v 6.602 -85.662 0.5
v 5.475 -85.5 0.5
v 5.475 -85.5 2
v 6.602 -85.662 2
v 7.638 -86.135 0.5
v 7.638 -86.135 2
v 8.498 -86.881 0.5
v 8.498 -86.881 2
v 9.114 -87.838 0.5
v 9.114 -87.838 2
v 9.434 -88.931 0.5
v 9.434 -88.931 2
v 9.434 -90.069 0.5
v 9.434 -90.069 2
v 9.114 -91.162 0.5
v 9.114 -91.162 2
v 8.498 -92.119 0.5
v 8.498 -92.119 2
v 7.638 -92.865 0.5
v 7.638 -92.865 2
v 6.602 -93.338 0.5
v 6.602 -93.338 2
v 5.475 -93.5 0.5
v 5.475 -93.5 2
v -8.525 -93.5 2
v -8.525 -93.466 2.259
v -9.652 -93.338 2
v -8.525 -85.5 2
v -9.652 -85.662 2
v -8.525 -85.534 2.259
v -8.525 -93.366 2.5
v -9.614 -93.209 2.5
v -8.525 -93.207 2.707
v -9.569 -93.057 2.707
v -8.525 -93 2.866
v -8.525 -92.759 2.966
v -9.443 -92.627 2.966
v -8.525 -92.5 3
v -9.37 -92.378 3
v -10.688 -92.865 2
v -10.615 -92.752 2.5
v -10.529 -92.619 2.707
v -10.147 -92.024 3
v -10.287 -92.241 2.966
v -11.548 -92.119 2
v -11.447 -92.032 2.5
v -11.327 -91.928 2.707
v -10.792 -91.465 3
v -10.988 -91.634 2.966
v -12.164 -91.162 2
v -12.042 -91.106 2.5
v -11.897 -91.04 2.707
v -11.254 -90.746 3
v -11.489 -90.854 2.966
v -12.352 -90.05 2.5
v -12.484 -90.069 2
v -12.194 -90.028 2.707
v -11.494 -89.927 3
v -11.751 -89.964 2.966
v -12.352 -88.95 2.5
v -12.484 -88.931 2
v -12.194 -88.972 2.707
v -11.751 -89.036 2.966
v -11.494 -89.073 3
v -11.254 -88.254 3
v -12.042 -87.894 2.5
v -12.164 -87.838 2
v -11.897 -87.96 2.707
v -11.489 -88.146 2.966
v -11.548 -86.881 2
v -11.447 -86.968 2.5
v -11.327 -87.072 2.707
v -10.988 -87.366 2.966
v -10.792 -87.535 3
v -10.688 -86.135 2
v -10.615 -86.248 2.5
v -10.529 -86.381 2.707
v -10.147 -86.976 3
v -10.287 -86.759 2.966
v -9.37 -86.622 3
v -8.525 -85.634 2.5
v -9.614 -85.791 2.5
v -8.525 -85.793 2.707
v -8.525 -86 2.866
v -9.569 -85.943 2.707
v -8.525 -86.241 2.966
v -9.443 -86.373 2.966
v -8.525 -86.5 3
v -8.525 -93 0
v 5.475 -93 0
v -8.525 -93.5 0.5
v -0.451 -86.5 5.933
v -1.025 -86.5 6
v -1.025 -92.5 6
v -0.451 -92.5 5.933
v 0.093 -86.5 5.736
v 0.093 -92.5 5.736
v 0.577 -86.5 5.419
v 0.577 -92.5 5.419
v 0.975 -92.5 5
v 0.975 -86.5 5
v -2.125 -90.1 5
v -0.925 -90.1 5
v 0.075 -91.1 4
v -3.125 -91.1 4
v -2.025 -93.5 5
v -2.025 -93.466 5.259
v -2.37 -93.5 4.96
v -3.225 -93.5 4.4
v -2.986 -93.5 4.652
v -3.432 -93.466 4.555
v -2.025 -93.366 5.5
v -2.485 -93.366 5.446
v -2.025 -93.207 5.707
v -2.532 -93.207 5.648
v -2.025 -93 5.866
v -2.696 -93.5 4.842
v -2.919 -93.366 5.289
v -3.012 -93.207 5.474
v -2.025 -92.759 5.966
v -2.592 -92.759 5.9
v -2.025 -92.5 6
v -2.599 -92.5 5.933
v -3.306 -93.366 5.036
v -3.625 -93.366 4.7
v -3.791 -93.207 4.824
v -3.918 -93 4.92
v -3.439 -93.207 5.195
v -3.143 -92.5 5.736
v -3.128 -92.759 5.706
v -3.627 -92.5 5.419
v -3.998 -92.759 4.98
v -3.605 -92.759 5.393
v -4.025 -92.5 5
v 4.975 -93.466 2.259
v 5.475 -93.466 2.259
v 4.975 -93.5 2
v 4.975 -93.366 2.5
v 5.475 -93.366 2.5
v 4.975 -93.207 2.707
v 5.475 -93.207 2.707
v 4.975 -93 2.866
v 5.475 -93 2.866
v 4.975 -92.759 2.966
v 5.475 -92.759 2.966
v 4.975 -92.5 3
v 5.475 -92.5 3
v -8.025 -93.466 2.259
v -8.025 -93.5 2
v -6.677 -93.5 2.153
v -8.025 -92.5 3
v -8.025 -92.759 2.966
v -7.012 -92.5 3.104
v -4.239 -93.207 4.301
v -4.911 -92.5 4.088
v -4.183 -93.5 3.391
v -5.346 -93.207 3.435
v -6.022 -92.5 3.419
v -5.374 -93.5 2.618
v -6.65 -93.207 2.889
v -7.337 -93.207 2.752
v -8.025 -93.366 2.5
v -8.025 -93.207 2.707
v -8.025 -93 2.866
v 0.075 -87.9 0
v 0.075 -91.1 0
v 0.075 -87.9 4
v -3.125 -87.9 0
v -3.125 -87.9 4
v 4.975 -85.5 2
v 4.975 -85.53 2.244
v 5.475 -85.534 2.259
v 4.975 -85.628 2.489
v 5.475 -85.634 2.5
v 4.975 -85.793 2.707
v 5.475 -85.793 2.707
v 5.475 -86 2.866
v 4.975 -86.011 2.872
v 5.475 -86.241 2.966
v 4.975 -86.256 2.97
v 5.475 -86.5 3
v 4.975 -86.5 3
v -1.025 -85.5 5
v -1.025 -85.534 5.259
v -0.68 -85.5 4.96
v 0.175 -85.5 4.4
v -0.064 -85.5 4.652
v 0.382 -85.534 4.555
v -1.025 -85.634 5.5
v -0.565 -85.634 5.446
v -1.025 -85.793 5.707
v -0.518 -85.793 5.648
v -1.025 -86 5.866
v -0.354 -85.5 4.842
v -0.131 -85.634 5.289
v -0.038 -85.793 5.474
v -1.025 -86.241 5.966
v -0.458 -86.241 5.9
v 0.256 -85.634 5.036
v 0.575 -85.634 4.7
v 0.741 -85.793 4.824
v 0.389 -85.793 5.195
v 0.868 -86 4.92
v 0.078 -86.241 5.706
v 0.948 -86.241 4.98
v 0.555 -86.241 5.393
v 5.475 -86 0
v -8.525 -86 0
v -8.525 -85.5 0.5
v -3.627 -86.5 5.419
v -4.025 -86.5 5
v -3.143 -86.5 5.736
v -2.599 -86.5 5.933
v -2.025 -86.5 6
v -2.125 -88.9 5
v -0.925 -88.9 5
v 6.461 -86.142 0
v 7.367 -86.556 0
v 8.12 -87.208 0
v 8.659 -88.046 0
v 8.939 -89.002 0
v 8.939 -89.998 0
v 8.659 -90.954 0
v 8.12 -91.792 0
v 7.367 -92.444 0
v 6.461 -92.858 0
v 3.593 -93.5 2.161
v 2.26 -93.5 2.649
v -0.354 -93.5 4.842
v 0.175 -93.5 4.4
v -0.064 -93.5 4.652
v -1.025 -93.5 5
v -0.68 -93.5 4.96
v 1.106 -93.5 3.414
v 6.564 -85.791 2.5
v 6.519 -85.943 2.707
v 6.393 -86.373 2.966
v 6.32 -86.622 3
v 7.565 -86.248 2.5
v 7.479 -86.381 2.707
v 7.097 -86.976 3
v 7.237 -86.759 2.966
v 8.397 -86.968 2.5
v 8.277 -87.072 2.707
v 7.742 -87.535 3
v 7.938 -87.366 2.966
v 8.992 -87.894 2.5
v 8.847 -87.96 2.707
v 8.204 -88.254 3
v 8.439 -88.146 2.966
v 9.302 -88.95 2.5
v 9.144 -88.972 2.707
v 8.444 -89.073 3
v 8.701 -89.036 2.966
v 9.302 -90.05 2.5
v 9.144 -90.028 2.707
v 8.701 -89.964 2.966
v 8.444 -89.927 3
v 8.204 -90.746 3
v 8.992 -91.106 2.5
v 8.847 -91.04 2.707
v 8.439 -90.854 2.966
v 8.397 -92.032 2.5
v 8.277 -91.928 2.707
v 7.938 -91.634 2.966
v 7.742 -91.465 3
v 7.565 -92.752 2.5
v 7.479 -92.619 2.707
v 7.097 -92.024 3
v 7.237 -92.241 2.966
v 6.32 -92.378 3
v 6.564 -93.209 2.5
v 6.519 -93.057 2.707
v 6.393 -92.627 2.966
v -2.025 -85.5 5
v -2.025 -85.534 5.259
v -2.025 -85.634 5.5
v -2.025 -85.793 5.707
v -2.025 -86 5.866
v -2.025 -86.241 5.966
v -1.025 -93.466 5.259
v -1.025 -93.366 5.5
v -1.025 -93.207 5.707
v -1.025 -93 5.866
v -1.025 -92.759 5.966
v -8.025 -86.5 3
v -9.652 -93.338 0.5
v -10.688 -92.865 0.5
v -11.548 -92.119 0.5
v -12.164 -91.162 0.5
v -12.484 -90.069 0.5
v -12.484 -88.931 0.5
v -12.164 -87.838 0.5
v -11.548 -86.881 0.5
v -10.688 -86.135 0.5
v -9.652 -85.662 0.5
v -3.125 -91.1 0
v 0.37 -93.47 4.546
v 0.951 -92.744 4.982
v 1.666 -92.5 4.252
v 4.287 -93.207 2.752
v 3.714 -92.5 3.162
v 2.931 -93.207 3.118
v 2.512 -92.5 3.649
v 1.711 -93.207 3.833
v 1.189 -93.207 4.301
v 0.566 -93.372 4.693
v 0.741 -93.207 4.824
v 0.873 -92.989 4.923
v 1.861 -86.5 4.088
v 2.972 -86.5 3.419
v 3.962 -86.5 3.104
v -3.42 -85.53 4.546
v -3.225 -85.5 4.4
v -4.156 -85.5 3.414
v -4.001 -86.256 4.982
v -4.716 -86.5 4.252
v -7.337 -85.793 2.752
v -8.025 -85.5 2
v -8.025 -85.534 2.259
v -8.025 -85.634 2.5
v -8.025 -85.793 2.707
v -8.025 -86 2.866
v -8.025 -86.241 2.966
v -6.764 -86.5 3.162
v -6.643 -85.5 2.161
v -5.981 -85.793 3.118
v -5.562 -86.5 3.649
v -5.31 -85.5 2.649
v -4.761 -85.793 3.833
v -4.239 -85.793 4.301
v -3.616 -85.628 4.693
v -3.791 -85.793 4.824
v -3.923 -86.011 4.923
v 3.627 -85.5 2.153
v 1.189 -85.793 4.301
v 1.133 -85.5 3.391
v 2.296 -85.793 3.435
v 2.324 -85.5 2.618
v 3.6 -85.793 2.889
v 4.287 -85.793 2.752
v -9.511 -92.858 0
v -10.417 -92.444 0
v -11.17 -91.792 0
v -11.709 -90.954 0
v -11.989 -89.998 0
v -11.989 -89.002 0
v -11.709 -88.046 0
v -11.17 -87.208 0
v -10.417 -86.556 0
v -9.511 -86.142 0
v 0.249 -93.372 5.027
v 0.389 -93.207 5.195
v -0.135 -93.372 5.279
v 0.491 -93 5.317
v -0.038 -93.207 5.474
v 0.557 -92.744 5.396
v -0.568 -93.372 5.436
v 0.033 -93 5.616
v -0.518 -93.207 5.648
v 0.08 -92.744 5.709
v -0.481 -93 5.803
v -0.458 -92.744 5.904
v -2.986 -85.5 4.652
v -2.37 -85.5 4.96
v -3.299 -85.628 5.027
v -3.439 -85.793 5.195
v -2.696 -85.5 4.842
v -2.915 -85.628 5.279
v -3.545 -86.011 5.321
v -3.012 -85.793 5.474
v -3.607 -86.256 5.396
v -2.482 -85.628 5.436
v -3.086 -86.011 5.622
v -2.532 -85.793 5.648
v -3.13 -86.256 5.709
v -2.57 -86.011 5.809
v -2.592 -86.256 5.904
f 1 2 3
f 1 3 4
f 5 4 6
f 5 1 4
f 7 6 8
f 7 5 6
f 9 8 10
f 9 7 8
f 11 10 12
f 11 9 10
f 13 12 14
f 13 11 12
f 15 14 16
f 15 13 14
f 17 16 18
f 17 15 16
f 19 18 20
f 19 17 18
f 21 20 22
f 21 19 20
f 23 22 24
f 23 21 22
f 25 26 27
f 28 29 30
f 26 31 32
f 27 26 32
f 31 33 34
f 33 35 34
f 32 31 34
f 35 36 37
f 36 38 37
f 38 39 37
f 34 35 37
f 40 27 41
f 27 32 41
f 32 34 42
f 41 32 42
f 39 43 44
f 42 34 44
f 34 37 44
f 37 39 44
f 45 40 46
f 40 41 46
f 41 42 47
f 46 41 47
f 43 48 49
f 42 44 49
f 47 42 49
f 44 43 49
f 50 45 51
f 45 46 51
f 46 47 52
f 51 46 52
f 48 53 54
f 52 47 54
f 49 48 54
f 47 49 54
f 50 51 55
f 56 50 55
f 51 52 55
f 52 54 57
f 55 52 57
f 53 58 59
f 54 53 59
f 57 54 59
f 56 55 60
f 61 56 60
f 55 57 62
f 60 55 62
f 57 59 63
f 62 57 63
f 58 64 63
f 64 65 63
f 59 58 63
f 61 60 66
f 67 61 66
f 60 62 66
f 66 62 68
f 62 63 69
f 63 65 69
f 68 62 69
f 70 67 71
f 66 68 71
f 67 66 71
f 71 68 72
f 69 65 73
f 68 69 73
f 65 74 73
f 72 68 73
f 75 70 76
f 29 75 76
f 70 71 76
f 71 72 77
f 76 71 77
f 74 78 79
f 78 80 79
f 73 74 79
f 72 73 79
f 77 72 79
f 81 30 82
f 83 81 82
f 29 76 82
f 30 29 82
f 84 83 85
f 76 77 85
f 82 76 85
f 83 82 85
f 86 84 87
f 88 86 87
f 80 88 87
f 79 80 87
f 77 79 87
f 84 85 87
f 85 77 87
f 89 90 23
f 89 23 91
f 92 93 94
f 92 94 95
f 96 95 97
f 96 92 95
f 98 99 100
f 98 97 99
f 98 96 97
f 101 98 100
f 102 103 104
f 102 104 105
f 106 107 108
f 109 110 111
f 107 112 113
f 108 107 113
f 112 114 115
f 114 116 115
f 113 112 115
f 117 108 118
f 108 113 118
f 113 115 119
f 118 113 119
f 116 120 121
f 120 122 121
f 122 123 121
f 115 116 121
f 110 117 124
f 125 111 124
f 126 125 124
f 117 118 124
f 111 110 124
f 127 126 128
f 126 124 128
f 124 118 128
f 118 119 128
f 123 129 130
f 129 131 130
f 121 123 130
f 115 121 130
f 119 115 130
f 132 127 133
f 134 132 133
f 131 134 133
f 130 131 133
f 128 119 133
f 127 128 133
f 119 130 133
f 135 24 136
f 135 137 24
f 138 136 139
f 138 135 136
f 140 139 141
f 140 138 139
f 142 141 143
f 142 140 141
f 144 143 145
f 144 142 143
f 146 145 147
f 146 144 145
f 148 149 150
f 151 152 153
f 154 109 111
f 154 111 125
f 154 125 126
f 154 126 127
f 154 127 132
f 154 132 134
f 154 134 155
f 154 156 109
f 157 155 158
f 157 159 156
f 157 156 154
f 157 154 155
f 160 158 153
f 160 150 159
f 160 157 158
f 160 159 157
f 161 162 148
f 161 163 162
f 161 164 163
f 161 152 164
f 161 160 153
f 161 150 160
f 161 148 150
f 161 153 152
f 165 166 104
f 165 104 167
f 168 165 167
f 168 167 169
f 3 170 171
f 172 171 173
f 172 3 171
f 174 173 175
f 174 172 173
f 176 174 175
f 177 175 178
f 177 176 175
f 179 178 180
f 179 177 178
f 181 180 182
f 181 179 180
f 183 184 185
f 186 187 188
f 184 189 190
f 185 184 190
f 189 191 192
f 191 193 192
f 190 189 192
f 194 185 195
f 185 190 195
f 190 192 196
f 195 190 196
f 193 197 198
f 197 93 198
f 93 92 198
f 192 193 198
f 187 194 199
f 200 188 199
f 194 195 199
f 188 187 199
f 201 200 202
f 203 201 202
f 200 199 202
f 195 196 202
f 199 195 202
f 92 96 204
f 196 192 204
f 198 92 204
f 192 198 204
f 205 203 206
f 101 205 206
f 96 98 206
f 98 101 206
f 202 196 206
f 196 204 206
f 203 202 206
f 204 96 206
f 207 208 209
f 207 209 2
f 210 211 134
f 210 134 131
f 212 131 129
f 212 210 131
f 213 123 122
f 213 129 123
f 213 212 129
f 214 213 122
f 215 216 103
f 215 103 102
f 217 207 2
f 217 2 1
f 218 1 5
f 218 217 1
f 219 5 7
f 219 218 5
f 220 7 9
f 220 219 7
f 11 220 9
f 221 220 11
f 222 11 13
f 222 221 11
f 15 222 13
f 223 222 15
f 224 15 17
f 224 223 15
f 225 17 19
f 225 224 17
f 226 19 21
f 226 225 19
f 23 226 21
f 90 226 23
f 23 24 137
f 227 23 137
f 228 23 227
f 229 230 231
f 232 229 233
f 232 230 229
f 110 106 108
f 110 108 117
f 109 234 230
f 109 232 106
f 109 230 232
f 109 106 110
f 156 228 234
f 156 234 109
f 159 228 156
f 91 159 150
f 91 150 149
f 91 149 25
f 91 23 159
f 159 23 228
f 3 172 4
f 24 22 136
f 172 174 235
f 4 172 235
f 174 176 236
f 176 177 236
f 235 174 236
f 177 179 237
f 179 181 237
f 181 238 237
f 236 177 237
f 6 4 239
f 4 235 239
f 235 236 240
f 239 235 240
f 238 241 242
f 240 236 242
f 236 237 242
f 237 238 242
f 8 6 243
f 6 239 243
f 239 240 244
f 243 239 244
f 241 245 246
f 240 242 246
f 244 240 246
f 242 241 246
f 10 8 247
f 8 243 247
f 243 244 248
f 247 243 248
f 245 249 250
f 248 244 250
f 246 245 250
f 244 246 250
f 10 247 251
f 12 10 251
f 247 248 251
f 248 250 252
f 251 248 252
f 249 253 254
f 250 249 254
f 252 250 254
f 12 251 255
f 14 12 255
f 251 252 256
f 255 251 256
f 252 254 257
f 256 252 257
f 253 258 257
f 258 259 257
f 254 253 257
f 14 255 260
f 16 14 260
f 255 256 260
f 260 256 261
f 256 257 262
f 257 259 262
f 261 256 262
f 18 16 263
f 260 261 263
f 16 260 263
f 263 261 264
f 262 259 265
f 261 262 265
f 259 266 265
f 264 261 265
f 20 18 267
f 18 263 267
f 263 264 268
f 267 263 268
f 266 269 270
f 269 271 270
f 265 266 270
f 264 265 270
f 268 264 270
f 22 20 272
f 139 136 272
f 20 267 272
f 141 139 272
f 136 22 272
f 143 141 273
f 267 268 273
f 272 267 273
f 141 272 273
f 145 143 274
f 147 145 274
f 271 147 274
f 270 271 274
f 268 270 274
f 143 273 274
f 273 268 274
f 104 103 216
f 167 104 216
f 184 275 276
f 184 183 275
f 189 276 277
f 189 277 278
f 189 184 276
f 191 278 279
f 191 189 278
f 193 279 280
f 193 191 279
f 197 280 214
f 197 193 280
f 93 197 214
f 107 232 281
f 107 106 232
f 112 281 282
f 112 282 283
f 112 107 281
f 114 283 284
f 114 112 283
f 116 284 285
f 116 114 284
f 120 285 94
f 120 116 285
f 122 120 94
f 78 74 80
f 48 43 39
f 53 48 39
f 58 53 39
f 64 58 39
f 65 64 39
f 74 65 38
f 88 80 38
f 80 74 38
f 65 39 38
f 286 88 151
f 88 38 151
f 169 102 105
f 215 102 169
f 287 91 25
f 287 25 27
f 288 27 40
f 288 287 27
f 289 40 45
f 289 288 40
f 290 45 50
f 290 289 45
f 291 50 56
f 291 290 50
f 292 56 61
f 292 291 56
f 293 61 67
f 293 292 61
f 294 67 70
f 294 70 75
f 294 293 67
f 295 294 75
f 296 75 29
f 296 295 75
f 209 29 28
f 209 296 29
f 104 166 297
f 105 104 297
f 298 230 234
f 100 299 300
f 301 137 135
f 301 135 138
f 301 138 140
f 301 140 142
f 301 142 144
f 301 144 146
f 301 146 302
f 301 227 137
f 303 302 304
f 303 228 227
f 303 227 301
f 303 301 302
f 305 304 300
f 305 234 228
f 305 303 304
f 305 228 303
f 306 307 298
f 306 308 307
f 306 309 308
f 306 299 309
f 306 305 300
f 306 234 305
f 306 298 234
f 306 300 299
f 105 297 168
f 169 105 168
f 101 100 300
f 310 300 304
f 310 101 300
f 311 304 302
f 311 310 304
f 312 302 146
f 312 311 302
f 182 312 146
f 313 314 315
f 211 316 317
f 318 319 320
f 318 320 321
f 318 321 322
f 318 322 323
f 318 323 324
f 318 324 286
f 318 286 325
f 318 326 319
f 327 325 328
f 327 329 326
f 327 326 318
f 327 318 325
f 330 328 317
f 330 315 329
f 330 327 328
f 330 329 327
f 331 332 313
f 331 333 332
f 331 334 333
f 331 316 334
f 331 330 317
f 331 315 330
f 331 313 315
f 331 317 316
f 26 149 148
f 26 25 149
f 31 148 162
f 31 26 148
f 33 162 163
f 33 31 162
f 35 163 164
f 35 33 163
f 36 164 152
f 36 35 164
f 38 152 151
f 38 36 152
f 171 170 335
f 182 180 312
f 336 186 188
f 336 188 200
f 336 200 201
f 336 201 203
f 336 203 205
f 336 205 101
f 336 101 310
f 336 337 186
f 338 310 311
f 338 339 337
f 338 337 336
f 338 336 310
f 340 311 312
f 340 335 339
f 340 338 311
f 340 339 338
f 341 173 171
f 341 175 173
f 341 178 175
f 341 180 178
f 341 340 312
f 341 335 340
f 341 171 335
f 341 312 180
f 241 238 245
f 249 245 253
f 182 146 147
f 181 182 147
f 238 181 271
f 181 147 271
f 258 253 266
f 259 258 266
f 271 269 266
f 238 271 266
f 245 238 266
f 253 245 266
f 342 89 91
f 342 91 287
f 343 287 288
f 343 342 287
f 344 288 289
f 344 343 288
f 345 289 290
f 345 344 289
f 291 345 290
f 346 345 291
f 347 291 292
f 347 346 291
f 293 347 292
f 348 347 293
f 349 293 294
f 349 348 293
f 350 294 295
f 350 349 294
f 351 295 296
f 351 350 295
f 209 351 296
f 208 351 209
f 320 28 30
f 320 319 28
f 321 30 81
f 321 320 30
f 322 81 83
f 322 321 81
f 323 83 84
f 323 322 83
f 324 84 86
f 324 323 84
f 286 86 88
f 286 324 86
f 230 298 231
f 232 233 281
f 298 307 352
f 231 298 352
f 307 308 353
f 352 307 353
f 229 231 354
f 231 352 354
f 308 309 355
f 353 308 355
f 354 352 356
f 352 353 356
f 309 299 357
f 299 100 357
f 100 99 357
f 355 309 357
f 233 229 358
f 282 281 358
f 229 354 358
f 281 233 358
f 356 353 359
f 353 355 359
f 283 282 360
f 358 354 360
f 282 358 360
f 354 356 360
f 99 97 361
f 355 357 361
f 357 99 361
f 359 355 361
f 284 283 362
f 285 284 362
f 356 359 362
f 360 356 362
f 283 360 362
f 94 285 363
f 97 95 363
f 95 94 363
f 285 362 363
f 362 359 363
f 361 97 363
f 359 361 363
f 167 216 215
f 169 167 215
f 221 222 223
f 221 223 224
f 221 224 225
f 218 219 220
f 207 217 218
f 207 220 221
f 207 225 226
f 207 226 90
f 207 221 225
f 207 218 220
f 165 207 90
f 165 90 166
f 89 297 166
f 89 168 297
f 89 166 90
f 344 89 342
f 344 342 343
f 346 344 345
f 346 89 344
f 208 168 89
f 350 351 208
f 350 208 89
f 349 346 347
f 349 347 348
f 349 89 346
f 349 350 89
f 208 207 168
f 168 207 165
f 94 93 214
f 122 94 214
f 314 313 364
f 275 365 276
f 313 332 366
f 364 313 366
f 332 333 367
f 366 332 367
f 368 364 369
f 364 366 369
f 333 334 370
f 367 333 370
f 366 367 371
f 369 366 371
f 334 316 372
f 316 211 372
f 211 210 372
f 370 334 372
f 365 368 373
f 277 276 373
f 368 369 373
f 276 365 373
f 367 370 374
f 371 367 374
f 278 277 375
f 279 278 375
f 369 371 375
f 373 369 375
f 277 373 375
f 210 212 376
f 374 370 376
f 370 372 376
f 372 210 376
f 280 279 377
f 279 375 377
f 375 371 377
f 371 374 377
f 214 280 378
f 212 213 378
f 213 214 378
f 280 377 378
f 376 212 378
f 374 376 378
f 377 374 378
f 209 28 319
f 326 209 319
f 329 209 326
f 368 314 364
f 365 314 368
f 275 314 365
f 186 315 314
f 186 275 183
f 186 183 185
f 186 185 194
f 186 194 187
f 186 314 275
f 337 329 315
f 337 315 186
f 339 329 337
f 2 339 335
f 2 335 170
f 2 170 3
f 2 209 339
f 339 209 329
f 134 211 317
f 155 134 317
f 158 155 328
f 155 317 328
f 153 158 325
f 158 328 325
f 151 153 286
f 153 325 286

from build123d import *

# Parameters (mm, degrees)
BOSS_EXTRUDE1_DEPTH = 6
SKETCH2_W           = 8
SKETCH2_H           = 3
CUT_EXTRUDE1_DEPTH  = 17.027339923
SKETCH3_W           = 3.2
SKETCH3_H           = 3.2
CUT_EXTRUDE2_DEPTH  = 5
FILLET1_R           = 2.5
FILLET2_R           = 5
FILLET3_R           = 1
CHAMFER1_SIZE       = 0.5
CHAMFER2_SIZE       = 1


with BuildPart() as part:
    # Sketch1 → Boss-Extrude1 (new body)
    with BuildSketch(Plane.XY):
        with BuildLine():
            Line((5.475, -93.5), (-8.525, -93.5))
            ThreePointArc((-8.525, -93.5), (-12.525, -89.5), (-8.525, -85.5))
            Line((-8.525, -85.5), (5.475, -85.5))
            ThreePointArc((5.475, -85.5), (9.475, -89.5), (5.475, -93.5))
        make_face()
    extrude(amount=BOSS_EXTRUDE1_DEPTH)

    # Sketch2 → Cut-Extrude1 (cut, through all)
    with BuildSketch(Plane.XZ.offset(93.5)):
        with Locations((-8.525, 4.5)):
            Rectangle(SKETCH2_W, SKETCH2_H)
        with Locations((5.475, 4.5)):
            Rectangle(SKETCH2_W, SKETCH2_H)
    extrude(amount=-CUT_EXTRUDE1_DEPTH, mode=Mode.SUBTRACT)

    # Sketch3 → Cut-Extrude2 (cut)
    with BuildSketch(Plane(origin=(0, 0, 0), x_dir=(-1, 0, 0), z_dir=(0, 0, -1))):
        with Locations((1.525, -89.5)):
            Rectangle(SKETCH3_W, SKETCH3_H)
    extrude(amount=-CUT_EXTRUDE2_DEPTH, mode=Mode.SUBTRACT)

    # Fillet1
    fillet1_edges = [part.edges().sort_by_distance(p)[0] for p in [
        (-4.525, -89.5, 6),
        (1.475, -89.5, 6),
    ]]
    fillet(fillet1_edges, radius=FILLET1_R)

    # Fillet2
    fillet2_edges = [part.edges().sort_by_distance(p)[0] for p in [
        (1.475, -89.5, 3),
        (-4.525, -89.5, 3),
    ]]
    fillet(fillet2_edges, radius=FILLET2_R)

    # Fillet3
    fillet3_edges = [part.edges().sort_by_distance(p)[0] for p in [
        (-5.788932023, -93.5, 3.527864045),
        (-5.788932023, -85.5, 3.527864045),
        (-12.525, -89.5, 3),
        (-8.275, -85.5, 3),
        (-8.275, -93.5, 3),
        (9.475, -89.5, 3),
        (-1.525, -93.5, 6),
        (-3.143033989, -93.5, 5.736067977),
        (-1.525, -85.5, 6),
        (0.093033989, -85.5, 5.736067977),
        (5.225, -85.5, 3),
        (5.225, -93.5, 3),
        (0.093033989, -93.5, 5.736067977),
        (-3.143033989, -85.5, 5.736067977),
        (2.738932023, -93.5, 3.527864045),
        (2.738932023, -85.5, 3.527864045),
    ]]
    fillet(fillet3_edges, radius=FILLET3_R)

    # Chamfer1
    chamfer1_edges = [part.edges().sort_by_distance(p)[0] for p in [
        (-1.525, -93.5, 0),
        (-12.525, -89.5, 0),
        (-1.525, -85.5, 0),
        (9.475, -89.5, 0),
    ]]
    chamfer(chamfer1_edges, length=CHAMFER1_SIZE)

    # Chamfer2
    chamfer2_edges = [part.edges().sort_by_distance(p)[0] for p in [
        (0.075, -89.5, 5),
        (-1.525, -87.9, 5),
        (-3.125, -89.5, 5),
        (-1.525, -91.1, 5),
    ]]
    chamfer(chamfer2_edges, length=CHAMFER2_SIZE)


solid = part.part
